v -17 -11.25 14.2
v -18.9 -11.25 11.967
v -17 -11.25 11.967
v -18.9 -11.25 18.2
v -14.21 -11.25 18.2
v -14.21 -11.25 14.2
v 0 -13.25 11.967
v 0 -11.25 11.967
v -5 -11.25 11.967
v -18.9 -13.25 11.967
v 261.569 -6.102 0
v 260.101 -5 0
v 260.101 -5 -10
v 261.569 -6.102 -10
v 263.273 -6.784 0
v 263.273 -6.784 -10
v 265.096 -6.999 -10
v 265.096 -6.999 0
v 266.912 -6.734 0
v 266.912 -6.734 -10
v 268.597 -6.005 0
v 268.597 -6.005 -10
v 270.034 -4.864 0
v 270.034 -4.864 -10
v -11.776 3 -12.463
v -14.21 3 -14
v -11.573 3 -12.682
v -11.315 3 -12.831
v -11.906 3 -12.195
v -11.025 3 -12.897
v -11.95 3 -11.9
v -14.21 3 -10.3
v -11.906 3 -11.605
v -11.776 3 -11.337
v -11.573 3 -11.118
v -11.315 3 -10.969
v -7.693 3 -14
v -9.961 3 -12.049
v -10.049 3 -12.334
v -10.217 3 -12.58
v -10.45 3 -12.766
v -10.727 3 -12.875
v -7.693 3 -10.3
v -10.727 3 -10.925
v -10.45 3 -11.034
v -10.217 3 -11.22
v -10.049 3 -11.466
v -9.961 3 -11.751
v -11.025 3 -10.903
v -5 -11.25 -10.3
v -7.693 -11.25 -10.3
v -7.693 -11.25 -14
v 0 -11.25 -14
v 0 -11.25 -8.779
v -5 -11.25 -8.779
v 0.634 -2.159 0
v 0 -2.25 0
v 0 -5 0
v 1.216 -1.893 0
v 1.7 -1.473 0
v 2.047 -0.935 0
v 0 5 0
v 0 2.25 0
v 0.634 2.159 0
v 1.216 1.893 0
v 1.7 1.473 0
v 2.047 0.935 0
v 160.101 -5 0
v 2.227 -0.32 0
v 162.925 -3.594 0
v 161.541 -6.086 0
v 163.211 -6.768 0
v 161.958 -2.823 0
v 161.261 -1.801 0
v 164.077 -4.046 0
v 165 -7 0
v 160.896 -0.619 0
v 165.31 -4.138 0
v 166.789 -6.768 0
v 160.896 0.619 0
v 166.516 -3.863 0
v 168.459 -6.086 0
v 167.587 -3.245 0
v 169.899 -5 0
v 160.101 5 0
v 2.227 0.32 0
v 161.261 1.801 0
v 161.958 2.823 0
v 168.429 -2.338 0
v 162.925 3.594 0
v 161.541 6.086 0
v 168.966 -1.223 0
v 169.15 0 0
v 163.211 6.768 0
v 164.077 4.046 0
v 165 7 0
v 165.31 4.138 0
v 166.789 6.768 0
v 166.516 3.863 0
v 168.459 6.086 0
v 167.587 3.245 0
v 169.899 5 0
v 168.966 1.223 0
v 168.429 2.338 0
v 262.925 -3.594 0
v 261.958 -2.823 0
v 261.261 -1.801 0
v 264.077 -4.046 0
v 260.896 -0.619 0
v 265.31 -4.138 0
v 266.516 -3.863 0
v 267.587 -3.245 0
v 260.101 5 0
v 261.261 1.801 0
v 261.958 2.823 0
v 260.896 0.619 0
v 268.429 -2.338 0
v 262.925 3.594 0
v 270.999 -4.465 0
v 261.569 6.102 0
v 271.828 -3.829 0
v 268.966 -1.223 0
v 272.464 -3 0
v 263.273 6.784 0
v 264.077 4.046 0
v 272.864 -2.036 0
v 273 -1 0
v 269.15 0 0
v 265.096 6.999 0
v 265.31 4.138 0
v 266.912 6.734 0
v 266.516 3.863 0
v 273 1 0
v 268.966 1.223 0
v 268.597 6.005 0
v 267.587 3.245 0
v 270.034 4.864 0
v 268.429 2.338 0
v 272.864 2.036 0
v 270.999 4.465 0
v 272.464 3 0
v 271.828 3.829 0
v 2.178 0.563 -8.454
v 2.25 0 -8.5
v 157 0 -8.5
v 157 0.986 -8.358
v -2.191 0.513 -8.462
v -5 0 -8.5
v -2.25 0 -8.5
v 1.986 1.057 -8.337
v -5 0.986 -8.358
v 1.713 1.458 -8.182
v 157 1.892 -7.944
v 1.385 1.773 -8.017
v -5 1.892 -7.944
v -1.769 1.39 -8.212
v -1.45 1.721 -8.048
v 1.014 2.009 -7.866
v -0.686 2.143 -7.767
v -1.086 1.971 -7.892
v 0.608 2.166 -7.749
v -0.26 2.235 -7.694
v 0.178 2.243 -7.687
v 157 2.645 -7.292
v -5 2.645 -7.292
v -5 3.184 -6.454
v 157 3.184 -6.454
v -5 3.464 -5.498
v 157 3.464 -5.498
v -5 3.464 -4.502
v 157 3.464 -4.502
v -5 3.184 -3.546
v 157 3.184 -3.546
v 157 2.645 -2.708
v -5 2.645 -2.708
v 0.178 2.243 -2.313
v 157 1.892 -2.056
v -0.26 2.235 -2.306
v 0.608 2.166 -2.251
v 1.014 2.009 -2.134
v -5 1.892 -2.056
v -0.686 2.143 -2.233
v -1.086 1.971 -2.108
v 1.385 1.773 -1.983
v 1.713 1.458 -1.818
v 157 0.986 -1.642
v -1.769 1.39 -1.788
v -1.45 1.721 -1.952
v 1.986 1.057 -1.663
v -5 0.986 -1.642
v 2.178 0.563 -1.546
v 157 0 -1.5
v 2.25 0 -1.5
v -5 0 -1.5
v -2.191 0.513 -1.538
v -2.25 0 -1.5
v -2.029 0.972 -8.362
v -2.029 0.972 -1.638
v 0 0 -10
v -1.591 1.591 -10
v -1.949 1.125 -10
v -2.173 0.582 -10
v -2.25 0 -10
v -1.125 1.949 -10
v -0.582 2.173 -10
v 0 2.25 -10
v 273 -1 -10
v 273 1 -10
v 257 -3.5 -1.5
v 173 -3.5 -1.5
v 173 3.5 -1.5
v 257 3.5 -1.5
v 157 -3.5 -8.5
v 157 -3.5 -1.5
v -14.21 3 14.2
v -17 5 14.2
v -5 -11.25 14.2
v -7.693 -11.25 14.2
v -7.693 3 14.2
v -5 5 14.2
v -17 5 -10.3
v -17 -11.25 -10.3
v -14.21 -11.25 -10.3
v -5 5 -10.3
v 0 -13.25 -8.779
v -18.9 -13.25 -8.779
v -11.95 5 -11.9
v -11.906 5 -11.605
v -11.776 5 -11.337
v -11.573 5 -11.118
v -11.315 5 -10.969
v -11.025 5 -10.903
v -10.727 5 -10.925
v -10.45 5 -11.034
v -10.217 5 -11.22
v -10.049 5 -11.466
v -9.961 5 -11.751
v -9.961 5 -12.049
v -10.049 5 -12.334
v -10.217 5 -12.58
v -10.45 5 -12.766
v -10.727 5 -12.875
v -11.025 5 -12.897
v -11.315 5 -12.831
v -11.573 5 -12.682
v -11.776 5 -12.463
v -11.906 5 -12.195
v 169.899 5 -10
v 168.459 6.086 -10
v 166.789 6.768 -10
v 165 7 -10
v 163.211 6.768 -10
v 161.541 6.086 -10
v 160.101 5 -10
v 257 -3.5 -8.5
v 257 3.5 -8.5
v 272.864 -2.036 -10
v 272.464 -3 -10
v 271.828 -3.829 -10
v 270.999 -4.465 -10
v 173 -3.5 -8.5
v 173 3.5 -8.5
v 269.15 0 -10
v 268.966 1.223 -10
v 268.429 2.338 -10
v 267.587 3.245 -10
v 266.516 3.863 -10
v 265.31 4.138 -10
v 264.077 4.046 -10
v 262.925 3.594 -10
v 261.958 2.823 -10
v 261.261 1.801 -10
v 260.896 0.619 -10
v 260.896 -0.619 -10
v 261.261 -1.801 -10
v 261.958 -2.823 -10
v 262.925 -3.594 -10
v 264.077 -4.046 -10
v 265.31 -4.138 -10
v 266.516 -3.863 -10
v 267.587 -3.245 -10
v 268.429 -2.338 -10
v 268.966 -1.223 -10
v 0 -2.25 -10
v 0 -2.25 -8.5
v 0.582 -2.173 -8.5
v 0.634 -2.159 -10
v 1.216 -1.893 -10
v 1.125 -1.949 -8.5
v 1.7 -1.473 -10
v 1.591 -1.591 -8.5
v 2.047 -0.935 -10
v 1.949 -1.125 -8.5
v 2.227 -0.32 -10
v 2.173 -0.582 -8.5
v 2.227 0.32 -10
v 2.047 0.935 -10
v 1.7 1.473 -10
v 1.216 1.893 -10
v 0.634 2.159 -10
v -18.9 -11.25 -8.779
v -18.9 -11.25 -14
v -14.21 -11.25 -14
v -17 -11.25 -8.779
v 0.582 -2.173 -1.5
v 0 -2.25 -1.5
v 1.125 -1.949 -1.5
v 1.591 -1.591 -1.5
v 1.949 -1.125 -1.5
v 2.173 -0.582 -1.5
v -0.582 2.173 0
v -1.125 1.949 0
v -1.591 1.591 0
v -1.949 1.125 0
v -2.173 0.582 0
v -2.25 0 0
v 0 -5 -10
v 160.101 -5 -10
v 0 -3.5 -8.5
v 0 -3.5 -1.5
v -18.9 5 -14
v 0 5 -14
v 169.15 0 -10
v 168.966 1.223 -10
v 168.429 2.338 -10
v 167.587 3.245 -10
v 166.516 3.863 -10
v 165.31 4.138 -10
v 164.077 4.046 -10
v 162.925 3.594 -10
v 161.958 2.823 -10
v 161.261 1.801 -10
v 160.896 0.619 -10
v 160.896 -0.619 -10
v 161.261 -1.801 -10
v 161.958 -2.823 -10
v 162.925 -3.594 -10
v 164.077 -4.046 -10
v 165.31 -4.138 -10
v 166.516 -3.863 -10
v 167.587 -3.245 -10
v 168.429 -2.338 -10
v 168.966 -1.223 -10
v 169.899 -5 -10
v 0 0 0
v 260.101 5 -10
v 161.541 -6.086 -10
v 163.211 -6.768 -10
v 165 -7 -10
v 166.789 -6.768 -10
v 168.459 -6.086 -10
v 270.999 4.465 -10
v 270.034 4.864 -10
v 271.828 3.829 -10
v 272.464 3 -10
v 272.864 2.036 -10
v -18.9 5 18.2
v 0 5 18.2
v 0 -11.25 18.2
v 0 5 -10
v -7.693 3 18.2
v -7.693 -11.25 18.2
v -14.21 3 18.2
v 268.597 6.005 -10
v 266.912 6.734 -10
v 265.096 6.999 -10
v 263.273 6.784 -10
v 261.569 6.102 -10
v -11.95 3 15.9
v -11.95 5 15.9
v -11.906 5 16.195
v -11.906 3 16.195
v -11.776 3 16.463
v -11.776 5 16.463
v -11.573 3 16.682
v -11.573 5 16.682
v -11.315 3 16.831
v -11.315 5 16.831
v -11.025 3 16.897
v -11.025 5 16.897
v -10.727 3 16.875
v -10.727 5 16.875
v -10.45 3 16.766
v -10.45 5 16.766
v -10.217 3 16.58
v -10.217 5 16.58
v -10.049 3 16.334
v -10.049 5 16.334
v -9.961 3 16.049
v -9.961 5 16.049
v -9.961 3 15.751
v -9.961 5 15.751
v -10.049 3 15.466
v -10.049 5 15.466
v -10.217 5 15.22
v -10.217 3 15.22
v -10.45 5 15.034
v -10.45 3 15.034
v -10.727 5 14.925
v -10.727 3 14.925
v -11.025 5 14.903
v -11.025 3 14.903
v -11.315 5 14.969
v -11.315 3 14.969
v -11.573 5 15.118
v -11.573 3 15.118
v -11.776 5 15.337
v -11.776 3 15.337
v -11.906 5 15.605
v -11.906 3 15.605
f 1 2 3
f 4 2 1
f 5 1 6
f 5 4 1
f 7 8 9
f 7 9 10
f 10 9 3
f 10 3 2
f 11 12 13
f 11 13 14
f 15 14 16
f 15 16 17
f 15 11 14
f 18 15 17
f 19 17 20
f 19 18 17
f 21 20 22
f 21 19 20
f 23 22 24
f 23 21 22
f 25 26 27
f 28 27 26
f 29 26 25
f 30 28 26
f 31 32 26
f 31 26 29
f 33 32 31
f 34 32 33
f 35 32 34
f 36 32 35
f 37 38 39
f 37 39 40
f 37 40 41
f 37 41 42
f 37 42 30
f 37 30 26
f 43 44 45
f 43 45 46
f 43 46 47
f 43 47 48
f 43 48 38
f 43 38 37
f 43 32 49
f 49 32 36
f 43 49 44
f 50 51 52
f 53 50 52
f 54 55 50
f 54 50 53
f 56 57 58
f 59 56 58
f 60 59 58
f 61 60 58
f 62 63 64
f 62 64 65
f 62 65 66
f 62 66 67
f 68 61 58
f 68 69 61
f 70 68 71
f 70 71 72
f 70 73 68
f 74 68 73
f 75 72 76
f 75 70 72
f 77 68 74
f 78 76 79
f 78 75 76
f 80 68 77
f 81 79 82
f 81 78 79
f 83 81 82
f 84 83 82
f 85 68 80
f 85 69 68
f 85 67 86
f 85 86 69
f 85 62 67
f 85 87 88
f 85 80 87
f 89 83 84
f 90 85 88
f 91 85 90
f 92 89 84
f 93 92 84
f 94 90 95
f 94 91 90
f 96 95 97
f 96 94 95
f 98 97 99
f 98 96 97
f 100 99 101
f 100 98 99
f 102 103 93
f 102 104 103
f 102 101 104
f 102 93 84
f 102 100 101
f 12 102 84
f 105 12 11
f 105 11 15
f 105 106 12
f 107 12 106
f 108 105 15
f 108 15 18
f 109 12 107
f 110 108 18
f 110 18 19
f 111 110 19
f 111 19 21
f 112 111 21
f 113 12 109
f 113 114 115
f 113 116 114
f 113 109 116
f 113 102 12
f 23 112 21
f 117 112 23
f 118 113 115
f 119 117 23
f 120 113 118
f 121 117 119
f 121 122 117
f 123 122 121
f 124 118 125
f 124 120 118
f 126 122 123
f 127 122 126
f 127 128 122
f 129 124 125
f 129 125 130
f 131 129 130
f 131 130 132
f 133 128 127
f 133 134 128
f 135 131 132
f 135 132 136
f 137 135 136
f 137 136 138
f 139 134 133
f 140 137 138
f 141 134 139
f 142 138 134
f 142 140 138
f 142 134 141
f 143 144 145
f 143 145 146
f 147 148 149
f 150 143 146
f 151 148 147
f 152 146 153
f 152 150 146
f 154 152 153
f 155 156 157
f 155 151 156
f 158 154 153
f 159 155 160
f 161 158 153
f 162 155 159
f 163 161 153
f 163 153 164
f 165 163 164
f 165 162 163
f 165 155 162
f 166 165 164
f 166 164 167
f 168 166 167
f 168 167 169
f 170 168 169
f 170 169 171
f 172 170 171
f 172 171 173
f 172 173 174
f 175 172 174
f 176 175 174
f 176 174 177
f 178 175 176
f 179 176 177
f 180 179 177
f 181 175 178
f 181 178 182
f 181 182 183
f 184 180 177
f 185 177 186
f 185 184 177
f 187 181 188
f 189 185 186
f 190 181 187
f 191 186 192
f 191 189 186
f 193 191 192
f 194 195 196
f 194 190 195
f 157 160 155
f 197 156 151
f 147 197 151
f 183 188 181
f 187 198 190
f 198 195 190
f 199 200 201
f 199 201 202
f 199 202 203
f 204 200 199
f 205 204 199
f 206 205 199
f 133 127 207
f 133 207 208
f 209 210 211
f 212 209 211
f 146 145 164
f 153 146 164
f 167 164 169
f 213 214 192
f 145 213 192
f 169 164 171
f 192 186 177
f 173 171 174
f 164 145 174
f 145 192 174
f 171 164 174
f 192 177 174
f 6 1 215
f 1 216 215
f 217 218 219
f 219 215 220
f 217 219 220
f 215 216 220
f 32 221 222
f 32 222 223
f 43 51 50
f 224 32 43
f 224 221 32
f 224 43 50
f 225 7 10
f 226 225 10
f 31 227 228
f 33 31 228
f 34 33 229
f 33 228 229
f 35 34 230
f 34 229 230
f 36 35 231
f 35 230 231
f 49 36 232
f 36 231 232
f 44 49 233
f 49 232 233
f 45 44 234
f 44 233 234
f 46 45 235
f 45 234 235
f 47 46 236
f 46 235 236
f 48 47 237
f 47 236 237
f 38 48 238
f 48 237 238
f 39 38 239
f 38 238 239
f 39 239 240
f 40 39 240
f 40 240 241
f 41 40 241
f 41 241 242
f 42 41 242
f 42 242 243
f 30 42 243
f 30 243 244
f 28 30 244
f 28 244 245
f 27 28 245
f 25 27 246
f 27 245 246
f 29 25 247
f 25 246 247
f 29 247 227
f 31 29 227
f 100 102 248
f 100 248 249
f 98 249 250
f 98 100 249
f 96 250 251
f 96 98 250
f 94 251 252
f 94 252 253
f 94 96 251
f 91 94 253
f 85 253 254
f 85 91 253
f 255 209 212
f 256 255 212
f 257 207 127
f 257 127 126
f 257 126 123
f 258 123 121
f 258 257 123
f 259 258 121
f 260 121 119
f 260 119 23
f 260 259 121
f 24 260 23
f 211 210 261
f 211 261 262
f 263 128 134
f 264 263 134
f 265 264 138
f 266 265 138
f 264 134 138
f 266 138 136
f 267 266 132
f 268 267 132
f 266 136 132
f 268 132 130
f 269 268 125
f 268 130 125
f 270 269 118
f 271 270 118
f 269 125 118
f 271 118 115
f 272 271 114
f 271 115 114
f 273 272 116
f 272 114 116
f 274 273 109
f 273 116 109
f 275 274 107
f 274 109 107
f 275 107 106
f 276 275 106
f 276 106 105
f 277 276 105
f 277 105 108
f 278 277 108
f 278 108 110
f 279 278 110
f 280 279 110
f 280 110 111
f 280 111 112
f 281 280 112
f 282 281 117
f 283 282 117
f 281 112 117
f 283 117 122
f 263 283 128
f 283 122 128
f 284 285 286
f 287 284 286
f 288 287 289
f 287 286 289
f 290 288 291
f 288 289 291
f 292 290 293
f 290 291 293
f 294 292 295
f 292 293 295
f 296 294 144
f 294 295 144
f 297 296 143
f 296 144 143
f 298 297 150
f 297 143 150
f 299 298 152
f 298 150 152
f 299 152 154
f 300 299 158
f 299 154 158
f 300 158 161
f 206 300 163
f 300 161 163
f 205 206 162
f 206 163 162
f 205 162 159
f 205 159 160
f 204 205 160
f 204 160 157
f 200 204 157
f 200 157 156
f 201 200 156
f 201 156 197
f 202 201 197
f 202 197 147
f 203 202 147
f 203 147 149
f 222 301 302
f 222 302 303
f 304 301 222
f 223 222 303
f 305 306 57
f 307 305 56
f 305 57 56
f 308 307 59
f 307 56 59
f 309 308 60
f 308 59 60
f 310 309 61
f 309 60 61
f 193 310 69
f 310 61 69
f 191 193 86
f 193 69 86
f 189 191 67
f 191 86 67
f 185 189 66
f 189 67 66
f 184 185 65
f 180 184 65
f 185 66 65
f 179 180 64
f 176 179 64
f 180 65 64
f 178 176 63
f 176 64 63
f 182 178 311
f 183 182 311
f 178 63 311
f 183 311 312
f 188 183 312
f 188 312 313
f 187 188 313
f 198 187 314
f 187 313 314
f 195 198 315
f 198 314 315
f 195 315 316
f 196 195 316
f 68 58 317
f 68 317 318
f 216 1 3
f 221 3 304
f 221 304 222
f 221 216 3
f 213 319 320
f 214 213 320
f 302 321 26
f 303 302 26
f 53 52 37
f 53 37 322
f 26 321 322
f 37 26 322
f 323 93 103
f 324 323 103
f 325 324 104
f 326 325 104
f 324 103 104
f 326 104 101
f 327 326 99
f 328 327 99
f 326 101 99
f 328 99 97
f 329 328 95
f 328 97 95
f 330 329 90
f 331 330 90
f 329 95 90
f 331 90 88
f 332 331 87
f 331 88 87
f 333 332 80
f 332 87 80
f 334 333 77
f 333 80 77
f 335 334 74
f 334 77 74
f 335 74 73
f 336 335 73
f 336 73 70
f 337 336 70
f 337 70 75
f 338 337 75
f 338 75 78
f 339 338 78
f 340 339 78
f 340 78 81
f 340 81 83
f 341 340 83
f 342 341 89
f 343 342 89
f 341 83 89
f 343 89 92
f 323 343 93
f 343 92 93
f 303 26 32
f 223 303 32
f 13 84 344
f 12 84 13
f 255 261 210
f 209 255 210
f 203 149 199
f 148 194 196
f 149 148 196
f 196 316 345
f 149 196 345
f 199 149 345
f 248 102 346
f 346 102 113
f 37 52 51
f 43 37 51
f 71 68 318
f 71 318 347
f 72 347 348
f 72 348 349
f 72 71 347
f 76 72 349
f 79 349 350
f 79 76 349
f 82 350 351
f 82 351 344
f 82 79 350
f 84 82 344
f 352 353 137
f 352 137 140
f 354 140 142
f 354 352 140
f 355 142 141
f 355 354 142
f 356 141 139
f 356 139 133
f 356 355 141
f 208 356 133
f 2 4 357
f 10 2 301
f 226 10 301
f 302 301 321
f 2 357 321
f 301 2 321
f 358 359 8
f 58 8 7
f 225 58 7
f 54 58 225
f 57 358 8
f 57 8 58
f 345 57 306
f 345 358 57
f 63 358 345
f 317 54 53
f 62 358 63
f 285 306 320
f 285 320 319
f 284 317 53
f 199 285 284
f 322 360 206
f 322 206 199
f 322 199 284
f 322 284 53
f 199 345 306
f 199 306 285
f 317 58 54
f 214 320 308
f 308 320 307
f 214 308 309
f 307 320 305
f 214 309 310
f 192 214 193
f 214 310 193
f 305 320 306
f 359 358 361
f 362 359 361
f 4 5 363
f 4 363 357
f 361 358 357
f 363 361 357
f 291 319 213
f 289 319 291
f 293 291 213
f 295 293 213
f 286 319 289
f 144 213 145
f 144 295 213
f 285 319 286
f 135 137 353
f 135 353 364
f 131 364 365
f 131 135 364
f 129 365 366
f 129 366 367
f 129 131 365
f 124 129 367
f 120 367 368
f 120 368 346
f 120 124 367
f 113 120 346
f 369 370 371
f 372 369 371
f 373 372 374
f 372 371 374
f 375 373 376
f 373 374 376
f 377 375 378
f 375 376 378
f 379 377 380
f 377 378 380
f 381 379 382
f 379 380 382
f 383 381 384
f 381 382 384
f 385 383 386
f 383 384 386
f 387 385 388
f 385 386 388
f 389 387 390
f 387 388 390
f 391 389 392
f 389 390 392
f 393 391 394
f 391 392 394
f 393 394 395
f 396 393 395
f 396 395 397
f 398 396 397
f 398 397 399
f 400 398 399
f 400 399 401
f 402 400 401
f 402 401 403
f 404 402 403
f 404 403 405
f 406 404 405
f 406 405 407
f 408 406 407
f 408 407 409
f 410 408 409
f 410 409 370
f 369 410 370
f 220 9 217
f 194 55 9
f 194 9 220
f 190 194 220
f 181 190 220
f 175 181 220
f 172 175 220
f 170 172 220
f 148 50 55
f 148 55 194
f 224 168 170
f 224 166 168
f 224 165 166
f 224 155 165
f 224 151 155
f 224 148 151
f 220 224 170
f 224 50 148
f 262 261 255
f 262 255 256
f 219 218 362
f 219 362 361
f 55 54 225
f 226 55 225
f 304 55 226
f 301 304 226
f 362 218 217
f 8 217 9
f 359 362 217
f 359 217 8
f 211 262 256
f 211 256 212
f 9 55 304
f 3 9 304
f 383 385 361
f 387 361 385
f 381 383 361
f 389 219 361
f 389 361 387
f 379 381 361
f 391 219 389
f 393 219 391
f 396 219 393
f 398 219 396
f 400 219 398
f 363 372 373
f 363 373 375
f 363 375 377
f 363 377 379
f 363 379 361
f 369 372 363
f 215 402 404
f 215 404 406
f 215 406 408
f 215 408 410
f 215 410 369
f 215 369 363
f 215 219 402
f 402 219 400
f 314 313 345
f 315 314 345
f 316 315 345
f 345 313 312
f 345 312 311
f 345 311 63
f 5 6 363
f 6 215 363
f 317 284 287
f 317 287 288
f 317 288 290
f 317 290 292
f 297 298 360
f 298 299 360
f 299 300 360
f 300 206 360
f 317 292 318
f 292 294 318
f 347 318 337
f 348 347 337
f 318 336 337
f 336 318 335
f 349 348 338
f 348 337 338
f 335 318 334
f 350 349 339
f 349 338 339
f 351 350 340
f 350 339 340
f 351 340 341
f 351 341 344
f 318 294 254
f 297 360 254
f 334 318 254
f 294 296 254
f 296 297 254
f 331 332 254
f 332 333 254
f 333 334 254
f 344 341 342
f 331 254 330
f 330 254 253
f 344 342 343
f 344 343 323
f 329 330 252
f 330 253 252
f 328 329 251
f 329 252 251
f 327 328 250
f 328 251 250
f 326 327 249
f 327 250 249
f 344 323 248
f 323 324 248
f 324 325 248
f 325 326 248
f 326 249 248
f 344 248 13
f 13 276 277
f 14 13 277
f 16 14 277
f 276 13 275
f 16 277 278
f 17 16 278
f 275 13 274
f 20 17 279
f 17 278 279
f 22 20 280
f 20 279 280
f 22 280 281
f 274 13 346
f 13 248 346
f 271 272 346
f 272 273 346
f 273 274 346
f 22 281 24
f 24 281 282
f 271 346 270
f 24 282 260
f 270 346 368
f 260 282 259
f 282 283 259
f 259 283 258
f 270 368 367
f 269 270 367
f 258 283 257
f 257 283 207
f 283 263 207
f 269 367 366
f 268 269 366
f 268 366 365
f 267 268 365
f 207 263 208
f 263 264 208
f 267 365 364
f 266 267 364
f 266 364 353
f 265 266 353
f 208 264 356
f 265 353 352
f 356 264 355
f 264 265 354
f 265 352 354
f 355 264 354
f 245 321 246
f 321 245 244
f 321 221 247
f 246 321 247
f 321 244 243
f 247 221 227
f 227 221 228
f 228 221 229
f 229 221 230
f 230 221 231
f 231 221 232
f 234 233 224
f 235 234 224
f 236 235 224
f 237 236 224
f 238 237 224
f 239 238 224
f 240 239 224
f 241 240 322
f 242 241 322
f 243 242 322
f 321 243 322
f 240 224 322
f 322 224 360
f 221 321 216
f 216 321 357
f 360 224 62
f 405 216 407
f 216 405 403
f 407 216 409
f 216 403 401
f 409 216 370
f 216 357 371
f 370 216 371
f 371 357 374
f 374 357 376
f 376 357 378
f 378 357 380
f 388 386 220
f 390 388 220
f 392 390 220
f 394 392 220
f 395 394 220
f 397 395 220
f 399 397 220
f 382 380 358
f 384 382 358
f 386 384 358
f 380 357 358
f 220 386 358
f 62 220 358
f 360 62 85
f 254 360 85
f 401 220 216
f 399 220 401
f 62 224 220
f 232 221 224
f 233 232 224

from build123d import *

# Parameters (mm, degrees)
SKETCH_1_R          = 2.25
SKETCH_1_R_2        = 1.75
EXTRUDE_1_DEPTH     = 10
SKETCH_3_W          = 7
SKETCH_3_H          = 7
CUT_EXTRUDE_1_DEPTH = 276.22717889
EXTRUDE_2_DEPTH     = 4
SKETCH_7_R          = 1
CUT_EXTRUDE_2_DEPTH = 2
SKETCH_8_W          = 6.516904704
SKETCH_8_H          = 4
CUT_EXTRUDE_3_DEPTH = 3
SKETCH_9_W          = 1.9
SKETCH_9_H          = 5
EXTRUDE_3_DEPTH     = 24.5
SKETCH_10_W         = 5
SKETCH_10_H         = 5
EXTRUDE_4_DEPTH     = 14.2
EXTRUDE_9_DEPTH     = 4
SKETCH_12_R         = 1
CUT_EXTRUDE_4_DEPTH = 3
EXTRUDE_10_DEPTH    = 11.25
SKETCH_14_W         = 18.9
SKETCH_14_H         = 20.745864208
EXTRUDE_13_DEPTH    = 2
SKETCH_15_W         = 12
SKETCH_15_H         = 0.3
CUT_EXTRUDE_5_DEPTH = 272.22739998
SKETCH_16_W         = 16
SKETCH_16_H         = 10
EXTRUDE_14_DEPTH    = 10
FILLET_1_R          = 4
SKETCH_17_R         = 4.04
CUT_EXTRUDE_7_DEPTH = 10
SKETCH_20_R         = 7
SKETCH_20_R_2       = 4.04
EXTRUDE_15_DEPTH    = 10
FILLET_3_R          = 3.5
SKETCH_21_R         = 4.15
CUT_EXTRUDE_8_DEPTH = 10


with BuildPart() as part:
    # 草图1 → 凸台-拉伸1 (new body)
    with BuildSketch(Plane.XY):
        with BuildLine():
            Line((265, 5), (-5, 5))
            Line((-5, 5), (-5, -5))
            Line((-5, -5), (265, -5))
            ThreePointArc((265, -5), (270, 0), (265, 5))
        make_face()
        Circle(SKETCH_1_R, mode=Mode.SUBTRACT)
        with Locations((165, 0)):
            Circle(SKETCH_1_R_2, mode=Mode.SUBTRACT)
        with Locations((265, 0)):
            Circle(SKETCH_1_R_2, mode=Mode.SUBTRACT)
    extrude(amount=-EXTRUDE_1_DEPTH)

    # 草图3 → 切除-拉伸1 (cut, through all)
    with BuildSketch(Plane.ZY.offset(5)):
        with Locations((-5, 0)):
            Rectangle(SKETCH_3_W, SKETCH_3_H)
    extrude(amount=-CUT_EXTRUDE_1_DEPTH, mode=Mode.SUBTRACT)

    # 草图5 → 凸台-拉伸2 (add)
    with BuildSketch(Plane(origin=(0, 0, -10), x_dir=(-1, 0, 0), z_dir=(0, 0, -1))):
        Polygon((5, 5), (18.9, 5), (18.9, 0), (0, 0), (0, 5), align=None)
    extrude(amount=EXTRUDE_2_DEPTH)

    # 草图7 → 切除-拉伸2 (cut)
    with BuildSketch(Plane(origin=(0, 5, 0), x_dir=(1, 0, 0), z_dir=(0, 1, 0))):
        with Locations(Location((-10.95, 11.9, 0), (0, 0, 180))):
            Circle(SKETCH_7_R)
    extrude(amount=-CUT_EXTRUDE_2_DEPTH, mode=Mode.SUBTRACT)

    # 草图8 → 切除-拉伸3 (cut)
    with BuildSketch(Plane.XZ):
        with Locations((-10.951938586, -12)):
            Rectangle(SKETCH_8_W, SKETCH_8_H)
    extrude(amount=-CUT_EXTRUDE_3_DEPTH, mode=Mode.SUBTRACT)

    # 草图9 → 凸台-拉伸3 (add)
    with BuildSketch(Plane.XY.offset(-10)):
        with Locations((-17.95, 2.5)):
            Rectangle(SKETCH_9_W, SKETCH_9_H)
    extrude(amount=EXTRUDE_3_DEPTH)

    # 草图10 → 凸台-拉伸4 (add)
    with BuildSketch(Plane.XY):
        with Locations((-2.5, 2.5)):
            Rectangle(SKETCH_10_W, SKETCH_10_H)
    extrude(amount=EXTRUDE_4_DEPTH)

    # 草图11 → 凸台-拉伸9 (add)
    with BuildSketch(Plane.XY.offset(14.2)):
        Polygon((0, 0), (-7.693486234, 0), (-7.693486234, 3), (-14.210390938, 3), (-14.210390938, 0), (-18.9, 0), (-18.9, 5), (0, 5), align=None)
    extrude(amount=EXTRUDE_9_DEPTH)

    # 草图12 → 切除-拉伸4 (cut)
    with BuildSketch(Plane(origin=(0, 5, 0), x_dir=(1, 0, 0), z_dir=(0, 1, 0))):
        with Locations(Location((-10.95, -15.9, 0), (0, 0, 180))):
            Circle(SKETCH_12_R)
    extrude(amount=-CUT_EXTRUDE_4_DEPTH, mode=Mode.SUBTRACT)

    # 草图13 → 凸台-拉伸10 (add)
    with BuildSketch(Plane.XZ):
        Polygon((-14.210390938, -14), (-14.210390938, -10), (-17, -10), (-17, 14.2), (-14.210390938, 14.2), (-14.210390938, 18.2), (-18.9, 18.2), (-18.9, -14), align=None)
        Polygon((-7.693486234, -14), (0, -14), (0, -10), (0, 18.2), (-7.693486234, 18.2), (-7.693486234, 14.2), (-5, 14.2), (-5, -10), (-7.693486234, -10), align=None)
    extrude(amount=EXTRUDE_10_DEPTH)

    # 草图14 → 凸台-拉伸13 (add)
    with BuildSketch(Plane(origin=(0, -11.25, 0), x_dir=(-1, 0, 0), z_dir=(0, -1, 0))):
        with Locations((9.45, -1.594289746)):
            Rectangle(SKETCH_14_W, SKETCH_14_H)
    extrude(amount=EXTRUDE_13_DEPTH)

    # 草图15 → 切除-拉伸5 (cut, through all)
    with BuildSketch(Plane(origin=(0, 5, 0), x_dir=(1, 0, 0), z_dir=(0, 1, 0))):
        with Locations((-11, 10.15)):
            Rectangle(SKETCH_15_W, SKETCH_15_H)
    extrude(amount=-CUT_EXTRUDE_5_DEPTH, mode=Mode.SUBTRACT)

    # 草图16 → 凸台-拉伸14 (add)
    with BuildSketch(Plane.XY):
        with Locations((165, 0)):
            Rectangle(SKETCH_16_W, SKETCH_16_H)
        with Locations((265, 0)):
            Rectangle(SKETCH_16_W, SKETCH_16_H)
    extrude(amount=-EXTRUDE_14_DEPTH)

    # 圆角1
    fillet_1_edges = [part.edges().sort_by_distance(p)[0] for p in [
        (273, -5, -5),
        (273, 5, -5),
    ]]
    fillet(fillet_1_edges, radius=FILLET_1_R)

    # 草图17 → 切除-拉伸7 (cut)
    with BuildSketch(Plane.XY):
        with Locations((165, 0)):
            Circle(SKETCH_17_R)
        with Locations((265, 0)):
            Circle(SKETCH_17_R)
    extrude(amount=-CUT_EXTRUDE_7_DEPTH, mode=Mode.SUBTRACT)

    # 草图20 → 凸台-拉伸15 (add)
    # profile 1 of 2: a face of its own
    with BuildSketch(Plane.XY):
        with Locations((165, 0)):
            Circle(SKETCH_20_R)
        with Locations((165, 0)):
            Circle(SKETCH_20_R_2, mode=Mode.SUBTRACT)
    # profile 2 of 2: a face of its own
    with BuildSketch(Plane.XY):
        with Locations((265, 0)):
            Circle(SKETCH_20_R)
        with Locations((265, 0)):
            Circle(SKETCH_20_R_2, mode=Mode.SUBTRACT)
    extrude(amount=-EXTRUDE_15_DEPTH)

    # 圆角3
    # the kernel refuses this fillet: 3.5 mm, written as the material it adds along each edge
    with BuildSketch(Plane(origin=(-5, 3.5, -8.5), x_dir=(0, -1, 0), z_dir=(1, 0, 0))) as fillet_3_piece_1_section:
        with BuildLine():
            CenterArc((FILLET_3_R, -FILLET_3_R), FILLET_3_R, 90, 90)
            Line((0, -FILLET_3_R), (0, 0))
            Line((0, 0), (FILLET_3_R, 0))
        make_face()
    fillet_3_piece_1 = extrude(amount=162, mode=Mode.PRIVATE)
    fillet_3_piece_1 = fillet_3_piece_1 - Plane(origin=(0, 0, -7.682274374), x_dir=(1, 0, 0), z_dir=(0, 0, 1)) * Cylinder(2.25, 339, mode=Mode.PRIVATE)
    add(fillet_3_piece_1)
    with BuildSketch(Plane(origin=(-5, 3.5, -1.5), x_dir=(0, -1, 0), z_dir=(1, 0, 0))) as fillet_3_piece_2_section:
        with BuildLine():
            CenterArc((FILLET_3_R, FILLET_3_R), FILLET_3_R, 180, 90)
            Line((0, FILLET_3_R), (0, 0))
            Line((0, 0), (FILLET_3_R, 0))
        make_face()
    fillet_3_piece_2 = extrude(amount=162, mode=Mode.PRIVATE)
    fillet_3_piece_2 = fillet_3_piece_2 - Plane(origin=(0, 0, -2.317725626), x_dir=(1, 0, 0), z_dir=(0, 0, 1)) * Cylinder(2.25, 339, mode=Mode.PRIVATE)
    add(fillet_3_piece_2)

    # 草图21 → 切除-拉伸8 (cut)
    with BuildSketch(Plane.XY):
        with Locations((165, 0)):
            Circle(SKETCH_21_R)
        with Locations((265, 0)):
            Circle(SKETCH_21_R)
    extrude(amount=-CUT_EXTRUDE_8_DEPTH, mode=Mode.SUBTRACT)


solid = part.part
